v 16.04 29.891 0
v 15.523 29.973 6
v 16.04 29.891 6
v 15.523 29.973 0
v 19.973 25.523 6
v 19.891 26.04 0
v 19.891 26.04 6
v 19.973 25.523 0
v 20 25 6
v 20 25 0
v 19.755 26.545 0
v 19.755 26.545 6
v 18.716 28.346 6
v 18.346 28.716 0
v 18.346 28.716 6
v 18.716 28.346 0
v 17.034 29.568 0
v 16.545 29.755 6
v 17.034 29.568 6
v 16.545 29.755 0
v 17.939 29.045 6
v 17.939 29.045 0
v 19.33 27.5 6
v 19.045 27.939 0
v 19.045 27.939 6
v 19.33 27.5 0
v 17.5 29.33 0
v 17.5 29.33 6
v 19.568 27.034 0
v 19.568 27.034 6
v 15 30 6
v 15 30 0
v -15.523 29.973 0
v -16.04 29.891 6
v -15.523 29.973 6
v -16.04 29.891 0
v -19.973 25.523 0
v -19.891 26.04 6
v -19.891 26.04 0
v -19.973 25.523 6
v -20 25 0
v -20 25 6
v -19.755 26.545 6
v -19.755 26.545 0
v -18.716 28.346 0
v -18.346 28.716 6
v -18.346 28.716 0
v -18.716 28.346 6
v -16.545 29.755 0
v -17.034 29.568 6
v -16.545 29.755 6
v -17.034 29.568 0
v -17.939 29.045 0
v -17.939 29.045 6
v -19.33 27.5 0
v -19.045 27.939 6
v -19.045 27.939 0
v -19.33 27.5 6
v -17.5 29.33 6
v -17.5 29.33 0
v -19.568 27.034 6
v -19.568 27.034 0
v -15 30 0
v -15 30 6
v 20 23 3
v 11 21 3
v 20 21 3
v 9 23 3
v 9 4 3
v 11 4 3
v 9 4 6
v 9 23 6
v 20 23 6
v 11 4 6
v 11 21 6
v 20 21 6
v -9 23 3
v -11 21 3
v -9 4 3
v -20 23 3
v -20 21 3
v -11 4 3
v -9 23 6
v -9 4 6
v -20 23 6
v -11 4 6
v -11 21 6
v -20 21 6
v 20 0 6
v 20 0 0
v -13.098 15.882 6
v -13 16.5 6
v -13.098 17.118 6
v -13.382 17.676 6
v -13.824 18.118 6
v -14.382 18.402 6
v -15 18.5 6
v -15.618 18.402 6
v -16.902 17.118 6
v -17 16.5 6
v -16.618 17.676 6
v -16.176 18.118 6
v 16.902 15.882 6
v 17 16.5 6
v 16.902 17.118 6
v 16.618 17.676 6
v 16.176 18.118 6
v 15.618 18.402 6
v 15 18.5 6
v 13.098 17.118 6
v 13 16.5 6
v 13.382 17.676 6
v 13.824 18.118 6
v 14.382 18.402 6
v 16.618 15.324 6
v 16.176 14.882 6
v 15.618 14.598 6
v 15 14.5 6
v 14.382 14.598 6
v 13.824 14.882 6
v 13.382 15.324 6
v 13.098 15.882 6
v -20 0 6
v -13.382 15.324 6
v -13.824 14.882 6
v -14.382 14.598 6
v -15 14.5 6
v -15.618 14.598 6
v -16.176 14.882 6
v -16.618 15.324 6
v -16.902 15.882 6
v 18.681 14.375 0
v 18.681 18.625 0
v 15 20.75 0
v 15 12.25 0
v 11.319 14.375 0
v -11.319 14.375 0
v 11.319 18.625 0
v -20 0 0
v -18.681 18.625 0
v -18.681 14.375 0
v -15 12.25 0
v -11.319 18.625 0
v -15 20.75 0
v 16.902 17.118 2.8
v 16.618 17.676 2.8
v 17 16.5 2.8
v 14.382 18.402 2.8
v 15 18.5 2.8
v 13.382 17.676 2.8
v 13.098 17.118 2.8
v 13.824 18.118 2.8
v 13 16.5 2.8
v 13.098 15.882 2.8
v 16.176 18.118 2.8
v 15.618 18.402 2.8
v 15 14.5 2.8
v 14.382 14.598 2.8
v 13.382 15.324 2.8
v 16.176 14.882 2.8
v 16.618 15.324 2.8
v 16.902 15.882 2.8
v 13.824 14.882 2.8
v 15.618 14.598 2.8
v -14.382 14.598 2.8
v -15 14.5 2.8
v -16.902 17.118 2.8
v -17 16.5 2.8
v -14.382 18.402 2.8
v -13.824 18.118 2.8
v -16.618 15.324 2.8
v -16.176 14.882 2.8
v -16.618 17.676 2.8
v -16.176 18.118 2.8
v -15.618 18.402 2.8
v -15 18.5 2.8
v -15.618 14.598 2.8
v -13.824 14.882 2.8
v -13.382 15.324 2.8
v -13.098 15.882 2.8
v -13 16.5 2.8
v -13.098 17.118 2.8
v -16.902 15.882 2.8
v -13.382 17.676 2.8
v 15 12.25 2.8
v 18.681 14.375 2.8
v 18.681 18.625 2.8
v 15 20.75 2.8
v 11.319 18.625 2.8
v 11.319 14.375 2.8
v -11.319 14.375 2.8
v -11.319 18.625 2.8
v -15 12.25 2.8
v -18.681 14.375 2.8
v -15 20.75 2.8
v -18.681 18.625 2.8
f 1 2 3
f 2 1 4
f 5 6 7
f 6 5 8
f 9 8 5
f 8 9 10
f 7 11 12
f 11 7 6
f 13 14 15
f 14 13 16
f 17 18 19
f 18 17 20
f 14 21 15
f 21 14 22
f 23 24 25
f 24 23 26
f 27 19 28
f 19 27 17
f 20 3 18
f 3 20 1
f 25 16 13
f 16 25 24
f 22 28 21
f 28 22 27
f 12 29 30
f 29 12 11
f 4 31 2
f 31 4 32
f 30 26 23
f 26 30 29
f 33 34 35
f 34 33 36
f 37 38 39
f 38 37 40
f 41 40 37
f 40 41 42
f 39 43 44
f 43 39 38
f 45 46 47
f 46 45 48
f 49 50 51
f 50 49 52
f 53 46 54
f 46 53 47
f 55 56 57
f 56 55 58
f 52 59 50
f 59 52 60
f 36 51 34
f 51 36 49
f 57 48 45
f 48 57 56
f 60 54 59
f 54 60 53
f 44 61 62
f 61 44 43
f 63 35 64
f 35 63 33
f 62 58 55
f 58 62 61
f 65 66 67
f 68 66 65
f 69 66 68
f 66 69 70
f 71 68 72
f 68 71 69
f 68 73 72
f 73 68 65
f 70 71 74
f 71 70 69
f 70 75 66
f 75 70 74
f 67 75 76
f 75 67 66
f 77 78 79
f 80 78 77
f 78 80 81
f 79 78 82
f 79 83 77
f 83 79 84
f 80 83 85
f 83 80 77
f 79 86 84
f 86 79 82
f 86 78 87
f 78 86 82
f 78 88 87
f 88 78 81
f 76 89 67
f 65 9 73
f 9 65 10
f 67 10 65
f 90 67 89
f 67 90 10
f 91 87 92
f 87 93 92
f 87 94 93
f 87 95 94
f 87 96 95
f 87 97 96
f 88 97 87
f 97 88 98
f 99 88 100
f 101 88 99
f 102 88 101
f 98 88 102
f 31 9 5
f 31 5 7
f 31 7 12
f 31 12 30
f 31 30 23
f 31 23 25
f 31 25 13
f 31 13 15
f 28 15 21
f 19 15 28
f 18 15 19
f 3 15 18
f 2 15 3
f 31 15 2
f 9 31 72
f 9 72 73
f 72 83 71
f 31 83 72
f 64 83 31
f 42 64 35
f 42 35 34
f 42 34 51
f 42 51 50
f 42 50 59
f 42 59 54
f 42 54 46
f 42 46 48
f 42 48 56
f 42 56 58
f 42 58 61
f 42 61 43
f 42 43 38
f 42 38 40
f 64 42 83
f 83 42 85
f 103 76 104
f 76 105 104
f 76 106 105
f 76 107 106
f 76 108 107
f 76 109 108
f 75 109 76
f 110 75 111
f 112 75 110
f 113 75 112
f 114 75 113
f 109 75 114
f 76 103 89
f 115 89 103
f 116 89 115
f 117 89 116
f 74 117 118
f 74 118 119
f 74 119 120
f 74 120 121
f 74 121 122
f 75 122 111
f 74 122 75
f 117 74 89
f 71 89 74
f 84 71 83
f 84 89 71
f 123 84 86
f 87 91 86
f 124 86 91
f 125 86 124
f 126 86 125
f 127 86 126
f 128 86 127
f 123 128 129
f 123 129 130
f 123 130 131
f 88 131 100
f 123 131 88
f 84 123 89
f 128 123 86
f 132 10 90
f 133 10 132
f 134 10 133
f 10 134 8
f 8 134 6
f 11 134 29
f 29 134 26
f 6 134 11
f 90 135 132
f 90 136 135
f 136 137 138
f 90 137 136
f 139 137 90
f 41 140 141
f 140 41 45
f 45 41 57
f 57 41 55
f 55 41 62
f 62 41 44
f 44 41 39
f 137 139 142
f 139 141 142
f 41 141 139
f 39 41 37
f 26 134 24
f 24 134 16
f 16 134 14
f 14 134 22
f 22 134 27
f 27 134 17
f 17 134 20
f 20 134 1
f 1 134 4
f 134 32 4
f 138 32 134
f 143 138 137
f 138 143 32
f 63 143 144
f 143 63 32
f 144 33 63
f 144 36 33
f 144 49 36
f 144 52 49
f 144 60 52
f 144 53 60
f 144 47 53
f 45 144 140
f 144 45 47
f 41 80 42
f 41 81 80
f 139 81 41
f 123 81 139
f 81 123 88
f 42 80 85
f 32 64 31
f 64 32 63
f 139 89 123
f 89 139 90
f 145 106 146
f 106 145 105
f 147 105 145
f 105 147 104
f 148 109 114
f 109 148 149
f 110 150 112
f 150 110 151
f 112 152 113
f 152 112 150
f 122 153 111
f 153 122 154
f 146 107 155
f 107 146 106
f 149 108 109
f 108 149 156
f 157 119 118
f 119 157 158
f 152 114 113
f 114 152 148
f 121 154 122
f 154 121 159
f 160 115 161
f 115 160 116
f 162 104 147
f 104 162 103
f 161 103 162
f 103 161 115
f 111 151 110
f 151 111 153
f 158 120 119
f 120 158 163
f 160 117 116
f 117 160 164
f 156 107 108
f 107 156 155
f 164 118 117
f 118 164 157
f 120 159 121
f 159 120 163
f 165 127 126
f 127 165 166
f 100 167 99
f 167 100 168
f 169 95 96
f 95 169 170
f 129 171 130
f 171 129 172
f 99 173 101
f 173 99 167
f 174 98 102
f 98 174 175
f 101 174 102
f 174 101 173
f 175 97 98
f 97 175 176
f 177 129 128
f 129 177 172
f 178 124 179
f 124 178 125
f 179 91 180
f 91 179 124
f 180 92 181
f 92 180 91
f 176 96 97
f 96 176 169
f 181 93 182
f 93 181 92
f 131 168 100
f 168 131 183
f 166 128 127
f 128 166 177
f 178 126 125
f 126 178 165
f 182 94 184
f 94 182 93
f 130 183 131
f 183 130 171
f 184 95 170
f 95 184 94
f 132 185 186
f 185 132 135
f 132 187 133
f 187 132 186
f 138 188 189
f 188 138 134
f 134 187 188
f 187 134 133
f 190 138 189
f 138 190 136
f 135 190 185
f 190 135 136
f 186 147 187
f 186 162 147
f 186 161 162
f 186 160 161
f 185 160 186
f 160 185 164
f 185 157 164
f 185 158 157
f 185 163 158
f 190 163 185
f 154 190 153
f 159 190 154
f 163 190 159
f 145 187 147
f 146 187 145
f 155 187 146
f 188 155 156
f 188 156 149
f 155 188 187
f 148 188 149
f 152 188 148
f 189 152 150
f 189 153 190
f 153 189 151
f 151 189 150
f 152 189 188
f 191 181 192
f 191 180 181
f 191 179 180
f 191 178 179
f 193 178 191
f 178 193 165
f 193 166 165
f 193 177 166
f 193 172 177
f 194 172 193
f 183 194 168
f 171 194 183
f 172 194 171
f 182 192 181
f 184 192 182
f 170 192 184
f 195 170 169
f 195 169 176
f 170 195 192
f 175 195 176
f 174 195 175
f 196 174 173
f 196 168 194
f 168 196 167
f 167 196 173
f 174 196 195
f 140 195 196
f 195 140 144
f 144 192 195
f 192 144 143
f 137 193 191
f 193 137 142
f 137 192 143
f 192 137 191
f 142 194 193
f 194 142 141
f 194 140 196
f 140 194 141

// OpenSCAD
// file: Configuration.scad
in = 25.4;
tubeInWidth = 10.5;
tubeWall = 2.8;
tubeOutWidth = tubeInWidth+2*tubeWall;

boltHead = 8.5; 
boltR = 2;

filletRad = 5;

module fillet(){
	difference(){
		translate([0,0,-.5]) cube([filletRad+2,filletRad+2,height+1]);
		translate([0,0,-1])cylinder(r=filletRad, h=height+2, $fn=60);
	}
}
// main file
include <Configuration.scad>

width = 40;
depth = 30;
boltDepth = 13.5;
height = 6;



boltOffset = 15;
boltOff = 8.5;


difference(){
union(){
	translate([-width/2,0,0]) cube([width,depth,height]);
	}
	//fillet
	translate([width/2-filletRad,depth-filletRad,0])fillet();
	mirror([1,0,0]) translate([width/2-filletRad,depth-filletRad,0])fillet();
	//boltHoles
	translate([boltOffset,depth-boltDepth,-.5])cylinder(r=boltR, h = height+1, $fn = 20);
	mirror([1,0,0])translate([boltOffset,depth-boltDepth,-.5])cylinder(r=boltR, h = height+1, $fn = 20);	
	
	//boltHead
	translate([boltOffset,depth-boltDepth,-.2])rotate([0,0,30]) cylinder(r=boltHead/2, h=3, $fn=6);
	mirror([1,0,0]) translate([boltOffset,depth-boltDepth,-.2])rotate([0,0,30]) cylinder(r=boltHead/2, h=3, $fn=6);
		
	//WireChannels
	translate([width/2-11,4,height/2])	difference(){
	cube([11.5,19,4]);
	translate([2,-.5,-0.5])cube([10,17.5,5]);
	}
	mirror([1,0,0])	translate([width/2-11,4,height/2])
	difference(){
	cube([11.5,19,4]);
	translate([2,-.5,-0.5])cube([10,17.5,5]);
	}
	
	
	}
